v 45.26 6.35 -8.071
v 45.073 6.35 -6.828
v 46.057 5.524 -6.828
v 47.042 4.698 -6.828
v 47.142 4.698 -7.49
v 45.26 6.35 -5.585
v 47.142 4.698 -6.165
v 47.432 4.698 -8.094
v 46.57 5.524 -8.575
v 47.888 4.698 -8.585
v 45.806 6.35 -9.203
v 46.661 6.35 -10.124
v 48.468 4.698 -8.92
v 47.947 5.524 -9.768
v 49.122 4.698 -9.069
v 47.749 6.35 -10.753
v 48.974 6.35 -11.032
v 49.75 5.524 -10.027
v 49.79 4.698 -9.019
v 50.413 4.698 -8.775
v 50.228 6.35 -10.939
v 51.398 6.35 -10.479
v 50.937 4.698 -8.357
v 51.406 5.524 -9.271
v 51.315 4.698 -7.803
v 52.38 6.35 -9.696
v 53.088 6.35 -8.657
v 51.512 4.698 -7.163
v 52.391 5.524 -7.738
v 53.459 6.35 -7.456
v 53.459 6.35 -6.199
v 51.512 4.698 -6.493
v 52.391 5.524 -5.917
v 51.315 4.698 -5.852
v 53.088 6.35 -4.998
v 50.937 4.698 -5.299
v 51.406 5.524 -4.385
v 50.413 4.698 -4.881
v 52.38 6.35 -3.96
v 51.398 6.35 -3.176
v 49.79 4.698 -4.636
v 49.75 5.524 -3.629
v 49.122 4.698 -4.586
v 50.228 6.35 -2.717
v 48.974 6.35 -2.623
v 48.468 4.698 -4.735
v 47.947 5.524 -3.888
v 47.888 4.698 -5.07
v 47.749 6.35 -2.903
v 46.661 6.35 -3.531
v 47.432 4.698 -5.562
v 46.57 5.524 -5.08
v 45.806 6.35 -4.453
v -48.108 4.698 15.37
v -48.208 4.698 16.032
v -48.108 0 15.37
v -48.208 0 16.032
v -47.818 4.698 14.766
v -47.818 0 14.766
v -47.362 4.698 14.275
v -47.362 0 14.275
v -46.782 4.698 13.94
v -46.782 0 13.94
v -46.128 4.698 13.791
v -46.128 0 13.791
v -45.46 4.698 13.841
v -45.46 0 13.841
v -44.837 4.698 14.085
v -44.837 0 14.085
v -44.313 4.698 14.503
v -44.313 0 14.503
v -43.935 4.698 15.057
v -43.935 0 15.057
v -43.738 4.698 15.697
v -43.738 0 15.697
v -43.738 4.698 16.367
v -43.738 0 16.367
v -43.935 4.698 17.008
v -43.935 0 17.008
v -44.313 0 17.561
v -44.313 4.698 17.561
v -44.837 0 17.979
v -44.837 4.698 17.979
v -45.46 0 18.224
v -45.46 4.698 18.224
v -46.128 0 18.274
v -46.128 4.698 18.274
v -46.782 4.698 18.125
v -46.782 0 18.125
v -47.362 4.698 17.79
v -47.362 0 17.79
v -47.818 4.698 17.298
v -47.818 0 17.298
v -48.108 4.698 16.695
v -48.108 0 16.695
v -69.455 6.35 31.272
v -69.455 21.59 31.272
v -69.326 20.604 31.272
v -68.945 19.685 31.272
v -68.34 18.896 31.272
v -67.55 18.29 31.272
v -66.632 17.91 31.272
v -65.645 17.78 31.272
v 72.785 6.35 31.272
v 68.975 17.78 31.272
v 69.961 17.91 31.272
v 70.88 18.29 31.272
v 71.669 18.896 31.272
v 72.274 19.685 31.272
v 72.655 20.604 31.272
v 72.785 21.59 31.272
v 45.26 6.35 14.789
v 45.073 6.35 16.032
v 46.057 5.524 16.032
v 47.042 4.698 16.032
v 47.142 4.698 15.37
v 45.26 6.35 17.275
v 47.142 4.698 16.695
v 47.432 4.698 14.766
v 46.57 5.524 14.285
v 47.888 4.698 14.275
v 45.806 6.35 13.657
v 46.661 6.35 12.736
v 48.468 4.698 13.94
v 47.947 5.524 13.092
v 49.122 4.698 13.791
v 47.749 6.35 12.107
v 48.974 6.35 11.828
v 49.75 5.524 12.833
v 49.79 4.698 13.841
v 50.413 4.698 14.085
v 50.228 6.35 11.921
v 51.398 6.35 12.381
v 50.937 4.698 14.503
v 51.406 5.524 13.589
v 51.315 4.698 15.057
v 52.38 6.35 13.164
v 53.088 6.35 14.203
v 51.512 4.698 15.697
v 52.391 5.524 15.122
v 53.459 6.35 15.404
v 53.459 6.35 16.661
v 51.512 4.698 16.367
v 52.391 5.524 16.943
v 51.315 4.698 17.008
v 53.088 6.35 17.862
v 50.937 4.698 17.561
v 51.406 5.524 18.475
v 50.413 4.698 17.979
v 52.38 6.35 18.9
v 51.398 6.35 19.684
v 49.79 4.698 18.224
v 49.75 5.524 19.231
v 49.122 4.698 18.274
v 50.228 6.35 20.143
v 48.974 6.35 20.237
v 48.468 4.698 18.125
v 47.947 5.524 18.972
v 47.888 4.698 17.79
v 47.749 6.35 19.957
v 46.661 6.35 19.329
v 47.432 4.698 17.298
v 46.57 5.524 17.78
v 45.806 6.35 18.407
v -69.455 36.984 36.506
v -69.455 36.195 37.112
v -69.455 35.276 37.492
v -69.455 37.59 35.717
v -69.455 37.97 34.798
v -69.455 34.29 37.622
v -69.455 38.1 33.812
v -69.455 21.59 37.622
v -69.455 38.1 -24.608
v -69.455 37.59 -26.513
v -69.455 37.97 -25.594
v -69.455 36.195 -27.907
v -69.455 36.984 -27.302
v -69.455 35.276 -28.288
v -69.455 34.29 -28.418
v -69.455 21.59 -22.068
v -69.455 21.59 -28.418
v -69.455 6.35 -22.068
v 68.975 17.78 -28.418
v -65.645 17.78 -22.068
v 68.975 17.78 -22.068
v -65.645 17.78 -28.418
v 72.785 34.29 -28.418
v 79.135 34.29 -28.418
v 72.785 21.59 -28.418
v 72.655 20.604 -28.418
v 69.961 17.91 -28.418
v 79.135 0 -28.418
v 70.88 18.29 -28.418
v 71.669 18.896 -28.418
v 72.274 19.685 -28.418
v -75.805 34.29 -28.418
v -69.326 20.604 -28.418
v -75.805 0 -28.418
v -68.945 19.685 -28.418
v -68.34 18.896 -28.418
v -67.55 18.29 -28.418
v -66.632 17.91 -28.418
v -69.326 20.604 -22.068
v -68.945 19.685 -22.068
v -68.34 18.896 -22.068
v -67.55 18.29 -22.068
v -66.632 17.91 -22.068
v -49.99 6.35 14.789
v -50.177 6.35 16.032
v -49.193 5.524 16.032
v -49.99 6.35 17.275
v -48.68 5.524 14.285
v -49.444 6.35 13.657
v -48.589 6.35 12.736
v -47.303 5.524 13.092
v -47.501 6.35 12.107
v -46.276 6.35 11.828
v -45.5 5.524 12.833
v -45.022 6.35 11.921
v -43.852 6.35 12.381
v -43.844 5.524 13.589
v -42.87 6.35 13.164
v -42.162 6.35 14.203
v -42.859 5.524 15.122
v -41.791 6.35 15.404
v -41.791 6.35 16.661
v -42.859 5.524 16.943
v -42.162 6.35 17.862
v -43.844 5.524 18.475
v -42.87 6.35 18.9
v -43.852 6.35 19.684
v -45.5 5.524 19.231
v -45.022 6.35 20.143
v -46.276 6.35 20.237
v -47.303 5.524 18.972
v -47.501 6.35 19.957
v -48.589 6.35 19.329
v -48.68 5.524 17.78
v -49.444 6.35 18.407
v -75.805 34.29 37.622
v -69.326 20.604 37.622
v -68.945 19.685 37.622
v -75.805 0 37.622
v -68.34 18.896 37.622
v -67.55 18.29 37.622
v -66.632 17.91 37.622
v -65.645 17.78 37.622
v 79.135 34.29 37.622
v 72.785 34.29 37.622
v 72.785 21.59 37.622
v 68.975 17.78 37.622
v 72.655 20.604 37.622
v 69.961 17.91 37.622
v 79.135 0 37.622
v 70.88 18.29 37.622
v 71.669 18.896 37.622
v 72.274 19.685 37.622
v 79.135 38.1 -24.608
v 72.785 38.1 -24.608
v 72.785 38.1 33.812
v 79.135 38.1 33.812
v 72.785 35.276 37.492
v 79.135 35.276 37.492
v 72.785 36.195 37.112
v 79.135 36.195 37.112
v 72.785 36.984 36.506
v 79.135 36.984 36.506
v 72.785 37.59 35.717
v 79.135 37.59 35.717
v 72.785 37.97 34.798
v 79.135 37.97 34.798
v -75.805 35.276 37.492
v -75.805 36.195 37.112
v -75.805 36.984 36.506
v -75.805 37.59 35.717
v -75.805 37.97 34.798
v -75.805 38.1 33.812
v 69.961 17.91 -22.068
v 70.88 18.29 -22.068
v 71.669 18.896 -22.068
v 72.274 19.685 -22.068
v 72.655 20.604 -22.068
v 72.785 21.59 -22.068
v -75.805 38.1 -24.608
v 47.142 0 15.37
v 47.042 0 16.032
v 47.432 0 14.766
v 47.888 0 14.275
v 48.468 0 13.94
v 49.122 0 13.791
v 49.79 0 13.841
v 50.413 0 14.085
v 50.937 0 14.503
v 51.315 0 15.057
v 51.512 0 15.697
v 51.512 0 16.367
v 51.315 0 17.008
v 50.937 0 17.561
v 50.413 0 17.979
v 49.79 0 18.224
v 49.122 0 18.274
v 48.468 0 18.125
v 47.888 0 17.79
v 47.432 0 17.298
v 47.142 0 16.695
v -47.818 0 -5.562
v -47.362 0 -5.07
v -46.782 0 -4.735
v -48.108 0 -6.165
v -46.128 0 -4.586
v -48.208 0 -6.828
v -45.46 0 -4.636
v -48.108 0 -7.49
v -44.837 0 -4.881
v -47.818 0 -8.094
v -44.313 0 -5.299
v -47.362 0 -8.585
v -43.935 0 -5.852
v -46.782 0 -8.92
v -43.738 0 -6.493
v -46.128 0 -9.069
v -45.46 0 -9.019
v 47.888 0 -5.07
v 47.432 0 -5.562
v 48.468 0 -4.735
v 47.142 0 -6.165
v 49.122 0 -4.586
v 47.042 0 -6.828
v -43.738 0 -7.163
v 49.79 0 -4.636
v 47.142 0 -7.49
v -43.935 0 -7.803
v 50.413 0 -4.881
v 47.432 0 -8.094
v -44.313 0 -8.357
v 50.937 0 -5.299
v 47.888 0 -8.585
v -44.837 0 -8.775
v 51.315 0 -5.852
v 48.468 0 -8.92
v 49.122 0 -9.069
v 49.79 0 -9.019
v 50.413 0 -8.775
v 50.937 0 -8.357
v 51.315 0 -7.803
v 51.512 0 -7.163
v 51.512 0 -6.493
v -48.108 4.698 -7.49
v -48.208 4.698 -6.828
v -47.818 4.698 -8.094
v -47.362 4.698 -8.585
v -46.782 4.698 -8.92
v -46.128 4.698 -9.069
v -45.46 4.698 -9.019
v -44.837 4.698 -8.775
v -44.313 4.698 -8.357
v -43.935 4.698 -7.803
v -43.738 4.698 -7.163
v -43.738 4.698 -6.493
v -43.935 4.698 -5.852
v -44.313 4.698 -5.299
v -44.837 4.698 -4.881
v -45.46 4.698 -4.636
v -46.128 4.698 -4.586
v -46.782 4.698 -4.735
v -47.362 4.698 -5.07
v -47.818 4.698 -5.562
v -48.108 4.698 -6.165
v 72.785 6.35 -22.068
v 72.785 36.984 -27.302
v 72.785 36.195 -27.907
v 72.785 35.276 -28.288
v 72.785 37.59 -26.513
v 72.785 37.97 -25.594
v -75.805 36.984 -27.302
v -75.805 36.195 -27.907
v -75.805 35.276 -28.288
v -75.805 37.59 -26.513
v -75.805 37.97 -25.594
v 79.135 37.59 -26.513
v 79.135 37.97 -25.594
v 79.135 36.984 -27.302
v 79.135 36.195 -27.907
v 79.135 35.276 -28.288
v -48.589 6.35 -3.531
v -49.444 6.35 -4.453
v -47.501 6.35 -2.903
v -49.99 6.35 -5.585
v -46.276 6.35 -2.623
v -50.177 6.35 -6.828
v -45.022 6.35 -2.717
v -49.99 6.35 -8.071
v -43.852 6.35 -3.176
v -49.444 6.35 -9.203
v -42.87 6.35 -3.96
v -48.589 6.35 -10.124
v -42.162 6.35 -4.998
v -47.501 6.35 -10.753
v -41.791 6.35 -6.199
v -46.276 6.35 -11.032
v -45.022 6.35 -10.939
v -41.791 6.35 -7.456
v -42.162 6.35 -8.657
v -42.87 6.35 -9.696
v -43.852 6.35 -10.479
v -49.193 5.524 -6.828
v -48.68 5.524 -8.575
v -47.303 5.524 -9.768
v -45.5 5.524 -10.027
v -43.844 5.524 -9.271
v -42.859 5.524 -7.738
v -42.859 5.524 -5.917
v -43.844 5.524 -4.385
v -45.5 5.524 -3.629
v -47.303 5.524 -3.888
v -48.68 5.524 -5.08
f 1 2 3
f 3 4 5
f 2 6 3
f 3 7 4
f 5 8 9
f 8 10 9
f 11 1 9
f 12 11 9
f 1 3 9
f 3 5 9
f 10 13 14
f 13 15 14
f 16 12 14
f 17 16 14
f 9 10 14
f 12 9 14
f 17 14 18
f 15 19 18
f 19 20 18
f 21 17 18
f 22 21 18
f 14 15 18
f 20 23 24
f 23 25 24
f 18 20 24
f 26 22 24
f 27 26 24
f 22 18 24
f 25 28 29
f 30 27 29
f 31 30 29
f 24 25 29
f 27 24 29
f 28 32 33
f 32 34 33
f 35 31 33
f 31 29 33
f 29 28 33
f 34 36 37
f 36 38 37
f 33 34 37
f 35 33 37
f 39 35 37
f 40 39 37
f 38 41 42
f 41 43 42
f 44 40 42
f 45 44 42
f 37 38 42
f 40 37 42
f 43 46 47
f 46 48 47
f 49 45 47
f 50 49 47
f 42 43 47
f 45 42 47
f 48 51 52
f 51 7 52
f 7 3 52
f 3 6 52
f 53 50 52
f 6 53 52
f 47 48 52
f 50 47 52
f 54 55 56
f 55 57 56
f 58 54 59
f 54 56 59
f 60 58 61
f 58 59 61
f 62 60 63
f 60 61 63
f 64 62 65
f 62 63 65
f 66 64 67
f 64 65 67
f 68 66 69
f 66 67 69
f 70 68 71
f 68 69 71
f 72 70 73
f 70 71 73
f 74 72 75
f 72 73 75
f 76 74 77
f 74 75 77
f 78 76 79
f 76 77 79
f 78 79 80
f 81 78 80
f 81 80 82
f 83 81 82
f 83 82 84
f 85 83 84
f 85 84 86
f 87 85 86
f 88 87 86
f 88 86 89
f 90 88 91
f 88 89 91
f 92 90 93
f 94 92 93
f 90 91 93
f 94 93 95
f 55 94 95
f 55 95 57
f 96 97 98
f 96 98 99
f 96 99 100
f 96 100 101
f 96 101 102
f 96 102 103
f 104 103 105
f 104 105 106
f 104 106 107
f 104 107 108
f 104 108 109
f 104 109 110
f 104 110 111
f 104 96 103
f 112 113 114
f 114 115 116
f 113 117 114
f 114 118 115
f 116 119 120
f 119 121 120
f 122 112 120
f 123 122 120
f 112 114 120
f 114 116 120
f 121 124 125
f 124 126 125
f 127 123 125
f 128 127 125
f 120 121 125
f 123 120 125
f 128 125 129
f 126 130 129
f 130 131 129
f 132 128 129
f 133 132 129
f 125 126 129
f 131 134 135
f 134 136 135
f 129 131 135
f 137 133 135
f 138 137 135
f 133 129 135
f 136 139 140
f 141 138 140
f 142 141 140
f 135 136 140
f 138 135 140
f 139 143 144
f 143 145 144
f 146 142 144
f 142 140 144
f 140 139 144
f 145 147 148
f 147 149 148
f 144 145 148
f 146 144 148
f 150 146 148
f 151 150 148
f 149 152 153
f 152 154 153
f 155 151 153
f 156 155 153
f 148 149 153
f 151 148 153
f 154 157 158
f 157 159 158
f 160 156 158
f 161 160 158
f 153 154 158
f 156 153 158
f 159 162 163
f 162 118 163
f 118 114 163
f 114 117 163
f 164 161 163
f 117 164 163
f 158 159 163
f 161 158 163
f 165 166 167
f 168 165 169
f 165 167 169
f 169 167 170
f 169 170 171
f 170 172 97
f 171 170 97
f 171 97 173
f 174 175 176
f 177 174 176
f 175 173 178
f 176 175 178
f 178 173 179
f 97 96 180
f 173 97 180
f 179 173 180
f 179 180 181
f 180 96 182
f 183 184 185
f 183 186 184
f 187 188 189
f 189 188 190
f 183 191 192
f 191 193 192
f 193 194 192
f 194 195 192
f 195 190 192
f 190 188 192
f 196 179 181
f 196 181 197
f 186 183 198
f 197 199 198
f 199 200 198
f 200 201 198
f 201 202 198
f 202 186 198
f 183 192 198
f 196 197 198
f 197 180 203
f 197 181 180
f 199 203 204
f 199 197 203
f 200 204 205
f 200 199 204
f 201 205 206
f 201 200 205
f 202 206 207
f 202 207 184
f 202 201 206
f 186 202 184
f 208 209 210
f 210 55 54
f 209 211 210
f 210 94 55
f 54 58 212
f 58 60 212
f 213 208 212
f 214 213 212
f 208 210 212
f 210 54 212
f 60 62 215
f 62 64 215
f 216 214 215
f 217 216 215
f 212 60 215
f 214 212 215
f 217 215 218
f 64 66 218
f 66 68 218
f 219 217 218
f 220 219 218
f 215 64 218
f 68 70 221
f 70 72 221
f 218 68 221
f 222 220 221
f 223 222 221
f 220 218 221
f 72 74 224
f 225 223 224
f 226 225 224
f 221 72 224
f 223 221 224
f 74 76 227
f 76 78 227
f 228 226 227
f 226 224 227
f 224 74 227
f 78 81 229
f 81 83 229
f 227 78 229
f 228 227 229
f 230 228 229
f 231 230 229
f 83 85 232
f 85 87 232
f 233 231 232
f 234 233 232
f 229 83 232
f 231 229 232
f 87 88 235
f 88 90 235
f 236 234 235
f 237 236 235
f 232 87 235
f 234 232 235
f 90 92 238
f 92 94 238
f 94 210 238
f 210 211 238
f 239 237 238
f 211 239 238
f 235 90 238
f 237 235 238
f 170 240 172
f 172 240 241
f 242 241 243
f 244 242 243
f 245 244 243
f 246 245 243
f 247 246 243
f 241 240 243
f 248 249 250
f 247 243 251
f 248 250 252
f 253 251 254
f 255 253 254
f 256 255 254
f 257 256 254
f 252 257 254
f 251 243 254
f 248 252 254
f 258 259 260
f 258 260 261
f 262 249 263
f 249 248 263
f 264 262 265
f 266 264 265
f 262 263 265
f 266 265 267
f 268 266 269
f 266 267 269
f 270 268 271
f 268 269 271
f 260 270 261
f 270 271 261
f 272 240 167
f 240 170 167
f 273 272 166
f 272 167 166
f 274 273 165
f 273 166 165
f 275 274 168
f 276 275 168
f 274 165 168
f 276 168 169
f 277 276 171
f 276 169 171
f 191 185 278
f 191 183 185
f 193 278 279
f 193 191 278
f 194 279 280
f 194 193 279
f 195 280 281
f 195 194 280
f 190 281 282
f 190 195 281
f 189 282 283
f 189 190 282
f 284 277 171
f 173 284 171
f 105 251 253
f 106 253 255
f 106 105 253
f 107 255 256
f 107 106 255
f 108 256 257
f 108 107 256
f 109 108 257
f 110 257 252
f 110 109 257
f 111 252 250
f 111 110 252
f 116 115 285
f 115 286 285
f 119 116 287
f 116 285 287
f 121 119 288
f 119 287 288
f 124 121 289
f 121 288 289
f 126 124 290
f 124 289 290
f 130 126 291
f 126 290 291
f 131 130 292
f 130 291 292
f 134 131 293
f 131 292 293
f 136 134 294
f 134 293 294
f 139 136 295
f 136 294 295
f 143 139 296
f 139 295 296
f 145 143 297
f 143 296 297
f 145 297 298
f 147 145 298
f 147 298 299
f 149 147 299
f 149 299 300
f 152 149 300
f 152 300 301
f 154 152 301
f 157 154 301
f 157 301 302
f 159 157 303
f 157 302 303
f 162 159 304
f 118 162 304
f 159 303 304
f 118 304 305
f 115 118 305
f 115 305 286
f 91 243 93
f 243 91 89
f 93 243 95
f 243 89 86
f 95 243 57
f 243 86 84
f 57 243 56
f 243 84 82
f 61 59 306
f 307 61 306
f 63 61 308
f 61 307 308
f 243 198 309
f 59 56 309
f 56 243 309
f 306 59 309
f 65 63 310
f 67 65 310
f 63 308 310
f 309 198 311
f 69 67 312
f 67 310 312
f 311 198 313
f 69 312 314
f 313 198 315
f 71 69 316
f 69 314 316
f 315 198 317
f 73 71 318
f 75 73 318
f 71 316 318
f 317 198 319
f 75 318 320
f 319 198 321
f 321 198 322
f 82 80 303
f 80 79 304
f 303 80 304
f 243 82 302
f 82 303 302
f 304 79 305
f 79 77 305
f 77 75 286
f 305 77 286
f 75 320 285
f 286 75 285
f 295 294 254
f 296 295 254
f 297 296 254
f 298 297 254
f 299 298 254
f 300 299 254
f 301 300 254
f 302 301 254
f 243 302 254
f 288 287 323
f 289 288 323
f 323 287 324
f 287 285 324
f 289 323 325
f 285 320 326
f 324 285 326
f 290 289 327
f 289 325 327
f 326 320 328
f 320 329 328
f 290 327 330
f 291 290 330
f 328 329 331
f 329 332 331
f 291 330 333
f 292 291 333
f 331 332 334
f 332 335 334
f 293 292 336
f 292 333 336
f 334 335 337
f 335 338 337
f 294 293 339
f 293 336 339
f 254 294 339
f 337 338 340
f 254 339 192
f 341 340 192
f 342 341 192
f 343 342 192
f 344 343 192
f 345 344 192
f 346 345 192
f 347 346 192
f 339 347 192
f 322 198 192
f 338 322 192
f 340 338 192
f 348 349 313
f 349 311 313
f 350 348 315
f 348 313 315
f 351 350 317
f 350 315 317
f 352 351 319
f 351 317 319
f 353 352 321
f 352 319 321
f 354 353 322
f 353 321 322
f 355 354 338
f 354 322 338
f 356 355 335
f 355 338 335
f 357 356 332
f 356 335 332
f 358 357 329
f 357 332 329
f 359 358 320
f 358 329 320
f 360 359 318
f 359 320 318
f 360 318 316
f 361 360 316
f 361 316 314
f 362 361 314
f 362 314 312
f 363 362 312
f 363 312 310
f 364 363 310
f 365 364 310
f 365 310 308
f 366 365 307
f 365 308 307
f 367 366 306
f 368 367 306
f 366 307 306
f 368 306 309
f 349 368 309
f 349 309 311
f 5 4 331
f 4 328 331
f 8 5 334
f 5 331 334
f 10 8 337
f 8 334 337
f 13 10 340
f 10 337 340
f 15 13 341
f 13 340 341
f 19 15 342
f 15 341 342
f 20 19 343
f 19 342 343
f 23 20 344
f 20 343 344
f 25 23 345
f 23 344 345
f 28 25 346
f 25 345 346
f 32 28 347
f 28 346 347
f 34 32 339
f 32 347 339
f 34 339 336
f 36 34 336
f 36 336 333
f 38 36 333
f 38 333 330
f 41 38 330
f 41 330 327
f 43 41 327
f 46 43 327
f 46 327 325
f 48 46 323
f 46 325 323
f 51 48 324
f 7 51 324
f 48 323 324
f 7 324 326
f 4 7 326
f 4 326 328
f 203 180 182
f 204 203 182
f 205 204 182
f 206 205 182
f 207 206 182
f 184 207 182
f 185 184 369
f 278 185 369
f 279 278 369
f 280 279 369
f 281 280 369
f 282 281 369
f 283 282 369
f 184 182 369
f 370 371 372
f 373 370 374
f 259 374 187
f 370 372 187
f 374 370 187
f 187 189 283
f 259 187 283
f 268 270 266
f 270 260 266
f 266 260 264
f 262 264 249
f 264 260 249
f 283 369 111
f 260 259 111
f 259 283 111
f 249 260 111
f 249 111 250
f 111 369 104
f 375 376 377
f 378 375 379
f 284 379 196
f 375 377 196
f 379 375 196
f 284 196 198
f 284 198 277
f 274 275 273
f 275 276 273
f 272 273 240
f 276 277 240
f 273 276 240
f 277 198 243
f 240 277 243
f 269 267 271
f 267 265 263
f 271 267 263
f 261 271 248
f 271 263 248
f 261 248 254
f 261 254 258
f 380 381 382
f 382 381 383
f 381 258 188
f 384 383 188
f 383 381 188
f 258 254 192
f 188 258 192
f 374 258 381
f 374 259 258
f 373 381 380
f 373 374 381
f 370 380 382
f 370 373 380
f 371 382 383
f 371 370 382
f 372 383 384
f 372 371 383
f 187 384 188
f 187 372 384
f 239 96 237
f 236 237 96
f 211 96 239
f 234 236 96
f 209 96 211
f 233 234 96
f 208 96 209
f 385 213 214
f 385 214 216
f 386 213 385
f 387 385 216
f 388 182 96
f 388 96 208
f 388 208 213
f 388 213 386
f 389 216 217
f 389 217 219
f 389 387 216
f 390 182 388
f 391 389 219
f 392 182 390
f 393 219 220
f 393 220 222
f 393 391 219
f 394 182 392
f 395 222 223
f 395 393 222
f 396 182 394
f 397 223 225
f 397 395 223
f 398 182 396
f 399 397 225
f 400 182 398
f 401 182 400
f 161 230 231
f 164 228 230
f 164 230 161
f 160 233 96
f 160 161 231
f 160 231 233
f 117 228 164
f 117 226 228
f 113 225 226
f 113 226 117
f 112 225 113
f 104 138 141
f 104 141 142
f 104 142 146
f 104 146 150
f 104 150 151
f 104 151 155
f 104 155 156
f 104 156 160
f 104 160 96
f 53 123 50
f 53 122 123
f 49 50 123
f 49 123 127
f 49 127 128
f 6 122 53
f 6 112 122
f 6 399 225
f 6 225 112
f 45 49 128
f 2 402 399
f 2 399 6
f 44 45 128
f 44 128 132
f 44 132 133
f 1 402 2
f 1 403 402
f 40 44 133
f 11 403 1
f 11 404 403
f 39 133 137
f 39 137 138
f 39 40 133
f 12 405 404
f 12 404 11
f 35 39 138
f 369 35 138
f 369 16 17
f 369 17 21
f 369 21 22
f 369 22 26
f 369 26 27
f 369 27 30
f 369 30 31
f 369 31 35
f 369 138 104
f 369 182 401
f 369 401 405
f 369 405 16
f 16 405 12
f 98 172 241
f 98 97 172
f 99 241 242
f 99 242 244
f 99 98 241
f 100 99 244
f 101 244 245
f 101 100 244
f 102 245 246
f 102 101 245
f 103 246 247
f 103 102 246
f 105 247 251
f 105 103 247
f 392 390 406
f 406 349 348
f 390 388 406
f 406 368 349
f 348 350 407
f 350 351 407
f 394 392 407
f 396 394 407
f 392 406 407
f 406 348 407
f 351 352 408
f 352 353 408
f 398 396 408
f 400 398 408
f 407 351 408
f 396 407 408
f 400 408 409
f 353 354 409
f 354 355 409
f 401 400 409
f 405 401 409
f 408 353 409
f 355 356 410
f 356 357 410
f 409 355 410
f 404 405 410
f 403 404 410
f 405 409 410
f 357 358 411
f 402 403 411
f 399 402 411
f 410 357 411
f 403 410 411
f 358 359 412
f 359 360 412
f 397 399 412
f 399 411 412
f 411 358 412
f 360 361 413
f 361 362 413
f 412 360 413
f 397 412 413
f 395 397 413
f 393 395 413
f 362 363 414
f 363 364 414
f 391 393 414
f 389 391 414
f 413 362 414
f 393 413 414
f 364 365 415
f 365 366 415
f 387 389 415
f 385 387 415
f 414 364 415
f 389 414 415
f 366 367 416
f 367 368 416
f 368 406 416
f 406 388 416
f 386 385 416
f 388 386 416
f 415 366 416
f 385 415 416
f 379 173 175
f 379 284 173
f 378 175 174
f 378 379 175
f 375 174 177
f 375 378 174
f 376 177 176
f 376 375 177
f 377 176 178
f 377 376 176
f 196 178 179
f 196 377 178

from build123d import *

# Parameters (mm, degrees)
BOSS_EXTRUDE1_DEPTH                               = 38.1
BOSS_EXTRUDE1_2_DEPTH                             = 38.1
SKETCH1_4_W                                       = 142.24
SKETCH1_4_H                                       = 53.34
BOSS_EXTRUDE2_DEPTH                               = 6.35
SKETCH1_5_W                                       = 142.24
SKETCH1_5_H                                       = 6.35
BOSS_EXTRUDE3_DEPTH                               = 17.78
FILLET1_R                                         = 3.81
CSK_FOR_8_FLAT_HEAD_MACHINE_SCREW_100_D           = 4.4958
CSK_FOR_8_FLAT_HEAD_MACHINE_SCREW_100_CSINK_D     = 8.4328
CSK_FOR_8_FLAT_HEAD_MACHINE_SCREW_100_CSINK_ANGLE = 100


with BuildPart() as part:
    # Sketch1 → Boss-Extrude1 (new body)
    with BuildSketch(Plane(origin=(0, 0, 0), x_dir=(1, 0, 0), z_dir=(0, 1, 0))):
        Polygon((72.784549316, 28.417821782), (72.784549316, 22.067821782), (72.784549316, -31.272178218), (72.784549316, -37.622178218), (79.134549316, -37.622178218), (79.134549316, 28.417821782), align=None)
    extrude(amount=BOSS_EXTRUDE1_DEPTH)



with BuildPart() as body_2:
    # Sketch1 → Boss-Extrude1 2 (new body)
    with BuildSketch(Plane(origin=(0, 0, 0), x_dir=(1, 0, 0), z_dir=(0, 1, 0))):
        Polygon((-69.455450684, -31.272178218), (-69.455450684, 22.067821782), (-69.455450684, 28.417821782), (-75.805450684, 28.417821782), (-75.805450684, -37.622178218), (-69.455450684, -37.622178218), align=None)
    extrude(amount=BOSS_EXTRUDE1_2_DEPTH)


with BuildPart() as part_1:
    add(part.part)

    add(body_2.part)  # Boss-Extrude2 merges body 2
    # Sketch1<4> → Boss-Extrude2 (add)
    with BuildSketch(Plane(origin=(0, 0, 0), x_dir=(1, 0, 0), z_dir=(0, 1, 0))):
        with Locations((1.664549316, -4.602178218)):
            Rectangle(SKETCH1_4_W, SKETCH1_4_H)
    extrude(amount=BOSS_EXTRUDE2_DEPTH)

    # Sketch1<5> → Boss-Extrude3 (add)
    with BuildSketch(Plane(origin=(0, 0, 0), x_dir=(1, 0, 0), z_dir=(0, 1, 0))):
        with Locations((1.664549316, 25.242821782)):
            Rectangle(SKETCH1_5_W, SKETCH1_5_H)
        with Locations((1.664549316, -34.447178218)):
            Rectangle(SKETCH1_5_W, SKETCH1_5_H)
    extrude(amount=BOSS_EXTRUDE3_DEPTH)

    # Fillet1
    fillet1_edges = [part_1.edges().sort_by_distance(p)[0] for p in [
        (75.959549316, 38.1, 37.622178218),
        (75.959549316, 38.1, -28.417821782),
        (-72.630450684, 38.1, -28.417821782),
        (-72.630450684, 38.1, 37.622178218),
        (-69.455450684, 17.78, -25.242821782),
        (72.784549316, 17.78, -25.242821782),
        (72.784549316, 17.78, 34.447178218),
        (-69.455450684, 17.78, 34.447178218),
    ]]
    fillet(fillet1_edges, radius=FILLET1_R)

    # CSK for #8 Flat Head Machine Screw (100)2 (through all)
    with Locations(Plane(origin=(0, 6.35, 0), x_dir=(1, 0, 0), z_dir=(0, 1, 0))):
        with Locations((-45.960450684, -16.032178218), (-45.960450684, 6.827821782), (49.289549316, 6.827821782), (49.289549316, -16.032178218)):
            CounterSinkHole(CSK_FOR_8_FLAT_HEAD_MACHINE_SCREW_100_D / 2, CSK_FOR_8_FLAT_HEAD_MACHINE_SCREW_100_CSINK_D / 2, counter_sink_angle=CSK_FOR_8_FLAT_HEAD_MACHINE_SCREW_100_CSINK_ANGLE)


solid = part_1.part
